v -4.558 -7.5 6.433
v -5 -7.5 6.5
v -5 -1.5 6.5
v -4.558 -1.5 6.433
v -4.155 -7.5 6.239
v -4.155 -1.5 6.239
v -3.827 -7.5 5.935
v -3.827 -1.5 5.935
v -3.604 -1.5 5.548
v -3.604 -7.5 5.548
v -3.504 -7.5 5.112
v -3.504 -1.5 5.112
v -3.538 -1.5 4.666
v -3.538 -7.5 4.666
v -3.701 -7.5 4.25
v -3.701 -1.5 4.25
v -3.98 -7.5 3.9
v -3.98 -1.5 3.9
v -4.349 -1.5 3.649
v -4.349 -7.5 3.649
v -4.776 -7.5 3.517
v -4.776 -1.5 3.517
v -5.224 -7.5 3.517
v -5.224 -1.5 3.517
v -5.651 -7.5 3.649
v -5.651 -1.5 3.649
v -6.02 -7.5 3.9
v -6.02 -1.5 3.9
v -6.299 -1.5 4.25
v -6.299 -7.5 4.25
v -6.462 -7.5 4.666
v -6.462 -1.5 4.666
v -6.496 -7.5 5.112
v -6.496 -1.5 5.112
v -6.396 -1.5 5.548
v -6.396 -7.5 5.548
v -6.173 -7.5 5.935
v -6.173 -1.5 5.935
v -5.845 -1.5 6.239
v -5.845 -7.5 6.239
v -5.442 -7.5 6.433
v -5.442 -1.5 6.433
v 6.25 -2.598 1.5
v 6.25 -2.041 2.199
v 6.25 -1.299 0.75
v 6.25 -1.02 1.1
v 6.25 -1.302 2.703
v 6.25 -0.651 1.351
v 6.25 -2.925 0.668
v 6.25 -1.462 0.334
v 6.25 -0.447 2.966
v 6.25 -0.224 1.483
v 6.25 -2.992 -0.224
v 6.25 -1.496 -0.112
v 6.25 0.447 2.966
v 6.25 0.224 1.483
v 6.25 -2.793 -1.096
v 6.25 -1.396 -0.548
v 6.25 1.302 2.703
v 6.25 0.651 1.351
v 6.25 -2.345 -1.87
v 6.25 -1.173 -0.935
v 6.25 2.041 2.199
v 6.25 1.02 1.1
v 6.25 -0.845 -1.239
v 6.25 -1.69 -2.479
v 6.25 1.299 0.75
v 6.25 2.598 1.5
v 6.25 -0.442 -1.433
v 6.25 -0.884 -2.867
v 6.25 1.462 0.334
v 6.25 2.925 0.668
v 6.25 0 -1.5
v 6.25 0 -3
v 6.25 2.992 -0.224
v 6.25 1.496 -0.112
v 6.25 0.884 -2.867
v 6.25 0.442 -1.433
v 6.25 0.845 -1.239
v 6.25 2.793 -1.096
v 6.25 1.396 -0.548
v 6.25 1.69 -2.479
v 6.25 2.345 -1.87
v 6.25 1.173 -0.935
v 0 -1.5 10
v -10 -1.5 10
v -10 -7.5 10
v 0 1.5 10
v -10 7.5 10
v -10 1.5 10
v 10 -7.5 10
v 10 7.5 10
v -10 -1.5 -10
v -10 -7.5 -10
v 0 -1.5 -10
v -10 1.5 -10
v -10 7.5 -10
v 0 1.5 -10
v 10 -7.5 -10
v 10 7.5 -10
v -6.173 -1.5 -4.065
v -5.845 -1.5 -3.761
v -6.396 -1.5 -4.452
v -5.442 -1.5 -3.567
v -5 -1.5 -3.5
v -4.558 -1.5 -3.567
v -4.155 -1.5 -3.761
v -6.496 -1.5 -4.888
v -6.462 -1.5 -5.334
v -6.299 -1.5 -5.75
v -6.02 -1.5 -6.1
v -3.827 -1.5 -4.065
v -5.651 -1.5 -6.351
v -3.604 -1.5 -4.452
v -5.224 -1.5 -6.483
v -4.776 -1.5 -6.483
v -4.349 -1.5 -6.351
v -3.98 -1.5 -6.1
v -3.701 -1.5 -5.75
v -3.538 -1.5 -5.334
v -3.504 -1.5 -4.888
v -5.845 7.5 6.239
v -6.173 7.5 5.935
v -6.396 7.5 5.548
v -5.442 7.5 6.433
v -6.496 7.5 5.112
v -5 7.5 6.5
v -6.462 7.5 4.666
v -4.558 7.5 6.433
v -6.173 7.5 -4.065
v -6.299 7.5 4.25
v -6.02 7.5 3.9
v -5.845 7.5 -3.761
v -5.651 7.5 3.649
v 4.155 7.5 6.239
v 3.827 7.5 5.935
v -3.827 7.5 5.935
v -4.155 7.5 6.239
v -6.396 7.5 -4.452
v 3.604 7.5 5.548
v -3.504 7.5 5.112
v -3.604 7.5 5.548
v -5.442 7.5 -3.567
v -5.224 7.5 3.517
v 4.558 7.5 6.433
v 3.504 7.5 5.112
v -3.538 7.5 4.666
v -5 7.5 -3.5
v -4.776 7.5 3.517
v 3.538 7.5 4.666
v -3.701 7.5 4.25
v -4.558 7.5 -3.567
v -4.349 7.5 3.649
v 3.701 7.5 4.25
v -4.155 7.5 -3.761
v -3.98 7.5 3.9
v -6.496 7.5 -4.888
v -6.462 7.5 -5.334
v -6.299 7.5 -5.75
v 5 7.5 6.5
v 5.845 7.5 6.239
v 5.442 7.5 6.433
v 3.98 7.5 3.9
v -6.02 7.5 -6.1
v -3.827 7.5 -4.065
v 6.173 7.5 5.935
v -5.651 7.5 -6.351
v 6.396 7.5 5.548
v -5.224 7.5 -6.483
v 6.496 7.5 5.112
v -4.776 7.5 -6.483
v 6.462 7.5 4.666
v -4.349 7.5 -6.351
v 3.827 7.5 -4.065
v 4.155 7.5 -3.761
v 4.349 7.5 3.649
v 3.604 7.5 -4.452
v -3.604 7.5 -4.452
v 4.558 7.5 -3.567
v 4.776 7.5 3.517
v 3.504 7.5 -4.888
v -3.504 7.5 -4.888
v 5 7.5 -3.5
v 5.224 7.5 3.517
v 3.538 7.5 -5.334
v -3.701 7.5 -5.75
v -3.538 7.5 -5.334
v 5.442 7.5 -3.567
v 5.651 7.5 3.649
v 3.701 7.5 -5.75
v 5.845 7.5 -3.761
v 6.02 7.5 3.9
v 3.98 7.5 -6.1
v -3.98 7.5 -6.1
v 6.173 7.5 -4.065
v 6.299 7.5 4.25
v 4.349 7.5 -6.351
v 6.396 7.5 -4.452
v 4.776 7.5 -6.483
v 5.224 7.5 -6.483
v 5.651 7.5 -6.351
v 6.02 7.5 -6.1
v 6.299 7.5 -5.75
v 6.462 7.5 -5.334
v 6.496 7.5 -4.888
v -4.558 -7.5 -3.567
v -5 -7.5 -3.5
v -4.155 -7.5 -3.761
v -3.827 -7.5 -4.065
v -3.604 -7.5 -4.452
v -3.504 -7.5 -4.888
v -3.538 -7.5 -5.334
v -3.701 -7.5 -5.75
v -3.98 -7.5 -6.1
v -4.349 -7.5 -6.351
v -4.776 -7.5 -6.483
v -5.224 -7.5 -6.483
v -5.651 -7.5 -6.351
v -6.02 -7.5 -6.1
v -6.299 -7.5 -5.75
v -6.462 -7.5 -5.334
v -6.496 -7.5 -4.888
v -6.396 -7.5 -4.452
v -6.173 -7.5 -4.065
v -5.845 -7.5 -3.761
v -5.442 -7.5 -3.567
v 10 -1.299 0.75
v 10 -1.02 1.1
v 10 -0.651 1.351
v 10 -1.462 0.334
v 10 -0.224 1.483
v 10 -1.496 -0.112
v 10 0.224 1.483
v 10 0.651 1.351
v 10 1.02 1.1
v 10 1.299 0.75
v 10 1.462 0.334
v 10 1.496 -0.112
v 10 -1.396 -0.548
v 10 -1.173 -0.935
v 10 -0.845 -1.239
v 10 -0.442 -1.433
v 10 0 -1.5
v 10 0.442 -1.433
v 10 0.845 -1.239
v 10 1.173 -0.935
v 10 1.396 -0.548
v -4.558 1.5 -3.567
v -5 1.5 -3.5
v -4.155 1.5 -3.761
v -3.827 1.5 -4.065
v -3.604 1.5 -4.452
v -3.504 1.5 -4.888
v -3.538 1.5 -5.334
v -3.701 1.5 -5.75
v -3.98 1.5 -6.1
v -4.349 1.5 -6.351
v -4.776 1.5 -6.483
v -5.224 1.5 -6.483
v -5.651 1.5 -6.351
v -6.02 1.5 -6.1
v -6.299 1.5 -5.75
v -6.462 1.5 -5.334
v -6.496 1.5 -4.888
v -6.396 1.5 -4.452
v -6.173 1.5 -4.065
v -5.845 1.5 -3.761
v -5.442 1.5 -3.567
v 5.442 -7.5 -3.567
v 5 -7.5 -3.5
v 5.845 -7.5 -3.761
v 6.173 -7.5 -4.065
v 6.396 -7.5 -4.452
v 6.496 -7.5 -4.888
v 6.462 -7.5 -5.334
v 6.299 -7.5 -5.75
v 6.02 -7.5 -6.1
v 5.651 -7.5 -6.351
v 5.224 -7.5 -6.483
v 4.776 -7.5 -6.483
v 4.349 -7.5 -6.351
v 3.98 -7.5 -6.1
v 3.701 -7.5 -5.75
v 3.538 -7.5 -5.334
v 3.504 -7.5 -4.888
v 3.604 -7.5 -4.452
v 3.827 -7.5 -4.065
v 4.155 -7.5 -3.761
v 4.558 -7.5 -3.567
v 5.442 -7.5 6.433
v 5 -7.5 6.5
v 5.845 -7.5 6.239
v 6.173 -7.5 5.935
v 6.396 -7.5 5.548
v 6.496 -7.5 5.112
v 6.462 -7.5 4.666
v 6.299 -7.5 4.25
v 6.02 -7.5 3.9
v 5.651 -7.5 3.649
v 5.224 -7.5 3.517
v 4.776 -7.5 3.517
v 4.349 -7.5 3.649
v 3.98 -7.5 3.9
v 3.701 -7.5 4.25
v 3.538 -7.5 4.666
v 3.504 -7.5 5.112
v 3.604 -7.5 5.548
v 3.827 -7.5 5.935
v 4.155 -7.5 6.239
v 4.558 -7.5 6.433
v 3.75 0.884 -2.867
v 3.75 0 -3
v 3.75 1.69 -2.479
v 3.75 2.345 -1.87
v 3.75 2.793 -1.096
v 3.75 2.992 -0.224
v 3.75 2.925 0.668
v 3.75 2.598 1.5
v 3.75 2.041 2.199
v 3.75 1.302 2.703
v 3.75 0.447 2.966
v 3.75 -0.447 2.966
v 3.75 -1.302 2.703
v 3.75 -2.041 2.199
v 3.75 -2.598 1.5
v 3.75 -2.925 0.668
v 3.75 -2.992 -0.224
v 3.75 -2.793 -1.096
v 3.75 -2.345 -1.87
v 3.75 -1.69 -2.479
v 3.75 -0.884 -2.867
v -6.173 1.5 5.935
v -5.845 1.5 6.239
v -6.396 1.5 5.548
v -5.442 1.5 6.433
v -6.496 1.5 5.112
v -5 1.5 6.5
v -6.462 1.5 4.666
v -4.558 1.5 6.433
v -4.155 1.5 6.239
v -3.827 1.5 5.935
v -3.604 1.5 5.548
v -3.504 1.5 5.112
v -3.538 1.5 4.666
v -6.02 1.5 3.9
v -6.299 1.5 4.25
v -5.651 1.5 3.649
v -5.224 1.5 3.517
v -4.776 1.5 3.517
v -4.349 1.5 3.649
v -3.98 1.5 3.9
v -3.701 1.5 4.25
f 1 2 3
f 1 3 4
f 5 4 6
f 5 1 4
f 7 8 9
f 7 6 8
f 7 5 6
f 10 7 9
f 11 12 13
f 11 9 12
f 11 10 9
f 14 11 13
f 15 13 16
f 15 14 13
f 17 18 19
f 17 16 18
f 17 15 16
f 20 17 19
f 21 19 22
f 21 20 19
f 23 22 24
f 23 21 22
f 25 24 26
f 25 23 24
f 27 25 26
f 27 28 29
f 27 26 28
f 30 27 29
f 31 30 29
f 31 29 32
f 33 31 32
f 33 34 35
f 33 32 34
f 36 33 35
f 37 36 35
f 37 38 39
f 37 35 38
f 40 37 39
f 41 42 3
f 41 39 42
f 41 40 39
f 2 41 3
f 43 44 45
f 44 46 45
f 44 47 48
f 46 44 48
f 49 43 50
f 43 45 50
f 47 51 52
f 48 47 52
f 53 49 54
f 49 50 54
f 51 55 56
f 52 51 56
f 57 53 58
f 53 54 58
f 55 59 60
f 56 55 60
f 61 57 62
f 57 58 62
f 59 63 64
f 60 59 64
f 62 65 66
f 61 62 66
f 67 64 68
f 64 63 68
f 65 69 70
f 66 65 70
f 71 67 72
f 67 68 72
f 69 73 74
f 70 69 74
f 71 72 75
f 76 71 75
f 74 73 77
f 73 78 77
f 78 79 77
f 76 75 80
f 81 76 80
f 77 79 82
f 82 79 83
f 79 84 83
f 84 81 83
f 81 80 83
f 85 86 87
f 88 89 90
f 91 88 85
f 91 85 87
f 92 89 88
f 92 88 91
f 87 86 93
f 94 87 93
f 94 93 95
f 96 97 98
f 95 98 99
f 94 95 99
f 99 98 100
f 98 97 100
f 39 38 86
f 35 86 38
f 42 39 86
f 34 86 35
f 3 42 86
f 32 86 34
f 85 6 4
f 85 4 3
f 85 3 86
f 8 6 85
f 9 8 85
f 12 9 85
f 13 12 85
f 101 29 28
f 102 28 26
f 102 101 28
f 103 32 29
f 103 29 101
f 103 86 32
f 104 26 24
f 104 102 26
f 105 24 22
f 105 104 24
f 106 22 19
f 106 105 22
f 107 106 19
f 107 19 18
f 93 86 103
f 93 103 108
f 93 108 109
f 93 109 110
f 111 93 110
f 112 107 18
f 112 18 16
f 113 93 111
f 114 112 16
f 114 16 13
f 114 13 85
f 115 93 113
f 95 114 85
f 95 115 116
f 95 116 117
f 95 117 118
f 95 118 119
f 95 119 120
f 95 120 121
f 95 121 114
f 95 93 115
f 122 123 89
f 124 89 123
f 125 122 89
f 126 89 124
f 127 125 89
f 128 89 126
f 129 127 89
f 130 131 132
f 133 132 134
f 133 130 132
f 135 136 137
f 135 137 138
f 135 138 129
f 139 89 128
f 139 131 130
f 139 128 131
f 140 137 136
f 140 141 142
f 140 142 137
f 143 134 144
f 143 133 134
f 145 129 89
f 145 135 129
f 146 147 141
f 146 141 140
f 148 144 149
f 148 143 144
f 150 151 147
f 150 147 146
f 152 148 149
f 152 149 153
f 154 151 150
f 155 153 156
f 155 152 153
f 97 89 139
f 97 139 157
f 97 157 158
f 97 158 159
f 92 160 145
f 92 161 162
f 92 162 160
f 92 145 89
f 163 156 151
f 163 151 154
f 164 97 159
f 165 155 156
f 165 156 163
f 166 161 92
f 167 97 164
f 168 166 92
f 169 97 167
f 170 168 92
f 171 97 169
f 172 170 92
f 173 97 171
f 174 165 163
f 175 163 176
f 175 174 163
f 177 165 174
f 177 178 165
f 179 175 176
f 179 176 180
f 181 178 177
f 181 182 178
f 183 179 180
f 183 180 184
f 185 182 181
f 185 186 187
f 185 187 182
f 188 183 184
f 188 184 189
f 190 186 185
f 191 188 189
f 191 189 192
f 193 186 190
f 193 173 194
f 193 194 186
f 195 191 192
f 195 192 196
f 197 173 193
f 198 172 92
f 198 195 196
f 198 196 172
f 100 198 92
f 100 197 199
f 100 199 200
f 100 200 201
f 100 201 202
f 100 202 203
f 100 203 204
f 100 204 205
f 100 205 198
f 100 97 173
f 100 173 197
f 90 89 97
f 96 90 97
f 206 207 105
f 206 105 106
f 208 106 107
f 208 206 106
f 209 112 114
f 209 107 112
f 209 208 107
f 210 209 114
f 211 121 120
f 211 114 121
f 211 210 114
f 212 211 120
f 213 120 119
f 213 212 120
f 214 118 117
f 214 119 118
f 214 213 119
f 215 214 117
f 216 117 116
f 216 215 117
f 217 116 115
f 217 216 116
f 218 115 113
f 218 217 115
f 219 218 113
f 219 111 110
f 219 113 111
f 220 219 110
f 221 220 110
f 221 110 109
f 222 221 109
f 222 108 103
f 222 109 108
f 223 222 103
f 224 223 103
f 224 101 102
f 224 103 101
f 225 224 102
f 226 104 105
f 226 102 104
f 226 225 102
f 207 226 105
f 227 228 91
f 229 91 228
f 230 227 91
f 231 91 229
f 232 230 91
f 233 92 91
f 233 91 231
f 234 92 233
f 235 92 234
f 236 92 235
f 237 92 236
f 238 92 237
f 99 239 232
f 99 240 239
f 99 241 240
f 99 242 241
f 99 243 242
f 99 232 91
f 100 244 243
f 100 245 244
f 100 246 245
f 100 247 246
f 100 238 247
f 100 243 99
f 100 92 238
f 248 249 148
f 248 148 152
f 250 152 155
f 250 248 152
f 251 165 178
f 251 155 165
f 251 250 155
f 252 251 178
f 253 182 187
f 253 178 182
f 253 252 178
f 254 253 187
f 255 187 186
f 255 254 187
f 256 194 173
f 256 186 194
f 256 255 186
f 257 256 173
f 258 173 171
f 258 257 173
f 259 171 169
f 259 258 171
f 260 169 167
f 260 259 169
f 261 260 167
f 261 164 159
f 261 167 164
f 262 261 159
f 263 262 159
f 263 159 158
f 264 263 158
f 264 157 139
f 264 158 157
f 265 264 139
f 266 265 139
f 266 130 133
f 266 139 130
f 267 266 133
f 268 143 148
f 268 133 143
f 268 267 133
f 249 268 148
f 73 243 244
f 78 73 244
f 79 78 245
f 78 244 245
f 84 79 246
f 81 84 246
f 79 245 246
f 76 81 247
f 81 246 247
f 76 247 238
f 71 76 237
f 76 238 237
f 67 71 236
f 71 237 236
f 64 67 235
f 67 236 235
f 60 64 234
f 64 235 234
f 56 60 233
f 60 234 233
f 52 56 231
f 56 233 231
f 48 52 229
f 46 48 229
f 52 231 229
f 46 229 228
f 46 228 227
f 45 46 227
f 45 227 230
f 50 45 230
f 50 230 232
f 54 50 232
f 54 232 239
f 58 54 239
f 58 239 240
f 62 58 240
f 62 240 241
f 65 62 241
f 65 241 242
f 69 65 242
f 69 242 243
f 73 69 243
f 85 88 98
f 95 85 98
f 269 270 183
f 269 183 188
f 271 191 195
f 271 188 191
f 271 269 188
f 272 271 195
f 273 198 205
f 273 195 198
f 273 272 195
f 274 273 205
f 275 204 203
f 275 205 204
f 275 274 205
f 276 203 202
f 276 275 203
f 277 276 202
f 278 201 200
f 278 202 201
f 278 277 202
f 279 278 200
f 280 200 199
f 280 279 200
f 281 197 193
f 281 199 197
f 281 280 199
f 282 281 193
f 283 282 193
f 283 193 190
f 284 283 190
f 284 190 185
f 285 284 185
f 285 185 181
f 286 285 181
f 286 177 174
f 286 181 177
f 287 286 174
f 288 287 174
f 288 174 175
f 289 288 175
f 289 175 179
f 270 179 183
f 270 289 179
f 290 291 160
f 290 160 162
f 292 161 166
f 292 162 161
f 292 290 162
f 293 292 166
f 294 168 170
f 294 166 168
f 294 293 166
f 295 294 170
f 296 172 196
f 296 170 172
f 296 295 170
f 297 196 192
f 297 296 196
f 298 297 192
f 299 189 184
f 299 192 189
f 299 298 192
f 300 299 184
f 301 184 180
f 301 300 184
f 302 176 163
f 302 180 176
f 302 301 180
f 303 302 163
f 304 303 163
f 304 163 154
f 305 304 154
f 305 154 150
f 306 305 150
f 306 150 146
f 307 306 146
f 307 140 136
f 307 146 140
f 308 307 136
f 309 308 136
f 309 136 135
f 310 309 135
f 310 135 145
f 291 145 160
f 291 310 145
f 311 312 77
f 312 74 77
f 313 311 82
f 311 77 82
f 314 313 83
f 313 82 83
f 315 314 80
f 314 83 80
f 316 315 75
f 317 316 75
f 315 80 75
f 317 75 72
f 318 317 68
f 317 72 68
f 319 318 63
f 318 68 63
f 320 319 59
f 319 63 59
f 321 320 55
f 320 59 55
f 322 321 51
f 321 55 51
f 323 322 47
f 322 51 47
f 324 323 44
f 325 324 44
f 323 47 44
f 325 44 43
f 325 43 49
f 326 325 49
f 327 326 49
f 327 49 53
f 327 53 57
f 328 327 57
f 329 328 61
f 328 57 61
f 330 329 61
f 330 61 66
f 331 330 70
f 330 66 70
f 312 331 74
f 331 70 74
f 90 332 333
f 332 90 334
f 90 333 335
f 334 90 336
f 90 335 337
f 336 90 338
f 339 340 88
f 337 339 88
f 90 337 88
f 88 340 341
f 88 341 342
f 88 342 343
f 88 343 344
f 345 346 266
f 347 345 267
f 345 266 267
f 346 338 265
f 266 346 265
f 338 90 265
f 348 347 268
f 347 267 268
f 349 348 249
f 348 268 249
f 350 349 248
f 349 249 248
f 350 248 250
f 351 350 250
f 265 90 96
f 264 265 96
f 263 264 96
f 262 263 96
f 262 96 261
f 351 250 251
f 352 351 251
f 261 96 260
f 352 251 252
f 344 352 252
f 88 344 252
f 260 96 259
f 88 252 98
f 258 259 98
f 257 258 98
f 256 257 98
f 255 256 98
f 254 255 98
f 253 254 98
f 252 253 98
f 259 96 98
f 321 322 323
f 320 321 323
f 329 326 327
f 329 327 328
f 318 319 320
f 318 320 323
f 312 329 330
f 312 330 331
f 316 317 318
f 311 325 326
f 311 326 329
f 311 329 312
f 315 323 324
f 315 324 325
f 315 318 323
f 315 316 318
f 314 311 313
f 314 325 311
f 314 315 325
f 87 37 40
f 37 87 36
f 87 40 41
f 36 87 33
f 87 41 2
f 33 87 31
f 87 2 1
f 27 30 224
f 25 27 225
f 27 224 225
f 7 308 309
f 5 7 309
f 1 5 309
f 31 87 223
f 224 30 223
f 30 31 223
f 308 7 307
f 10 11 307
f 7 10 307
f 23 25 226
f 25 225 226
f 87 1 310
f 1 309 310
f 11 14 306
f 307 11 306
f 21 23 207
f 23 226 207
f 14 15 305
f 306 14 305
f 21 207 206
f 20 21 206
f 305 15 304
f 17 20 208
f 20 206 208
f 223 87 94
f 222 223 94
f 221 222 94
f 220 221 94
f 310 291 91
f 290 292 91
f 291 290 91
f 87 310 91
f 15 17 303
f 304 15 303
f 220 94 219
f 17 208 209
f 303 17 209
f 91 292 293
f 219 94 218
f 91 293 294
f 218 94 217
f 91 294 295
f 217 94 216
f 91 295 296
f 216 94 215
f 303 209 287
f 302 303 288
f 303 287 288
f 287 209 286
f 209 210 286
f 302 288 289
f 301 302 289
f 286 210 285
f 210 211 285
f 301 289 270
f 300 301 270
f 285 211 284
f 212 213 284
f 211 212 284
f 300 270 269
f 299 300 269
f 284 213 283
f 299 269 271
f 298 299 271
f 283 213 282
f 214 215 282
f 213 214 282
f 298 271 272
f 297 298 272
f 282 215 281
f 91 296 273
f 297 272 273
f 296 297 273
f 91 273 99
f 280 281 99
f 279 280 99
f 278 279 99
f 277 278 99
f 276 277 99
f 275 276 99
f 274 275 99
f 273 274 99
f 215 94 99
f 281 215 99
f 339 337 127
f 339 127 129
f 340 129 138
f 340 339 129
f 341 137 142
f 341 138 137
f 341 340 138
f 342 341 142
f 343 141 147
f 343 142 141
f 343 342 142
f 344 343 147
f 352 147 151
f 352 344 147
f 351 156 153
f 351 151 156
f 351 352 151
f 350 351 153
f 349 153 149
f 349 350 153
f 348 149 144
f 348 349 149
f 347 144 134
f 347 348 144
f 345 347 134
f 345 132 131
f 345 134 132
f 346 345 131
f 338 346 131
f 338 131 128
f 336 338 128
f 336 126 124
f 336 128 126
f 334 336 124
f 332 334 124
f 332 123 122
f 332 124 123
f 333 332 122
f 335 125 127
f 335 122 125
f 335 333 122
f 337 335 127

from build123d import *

# Parameters (mm, degrees)
SKETCH1_W            = 20
SKETCH1_H            = 20
BOSS_EXTRUDE1_DEPTH  = 7.5
SKETCH1_3_W          = 20
SKETCH1_3_H          = 20
CUT_EXTRUDE2_DEPTH   = 1.5
SKETCH3_W            = 10
SKETCH3_H            = 20
BOSS_EXTRUDE2_DEPTH  = 1.5
SKETCH4_R            = 1.5
CUT_EXTRUDE3_DEPTH   = 5
MOUNTHOLE_DEPTH      = 17.007810594
MOUNTHOLE_DEPTH_BACK = 17.007810594
SKETCH5_R            = 1.5
SKETCH6_R            = 3
CUT_EXTRUDE5_DEPTH   = 1.25


with BuildPart() as part:
    # Sketch1 → Boss-Extrude1 (new, symmetric)
    with BuildSketch(Plane(origin=(0, 0, 0), x_dir=(1, 0, 0), z_dir=(0, 1, 0))):
        Rectangle(SKETCH1_W, SKETCH1_H)
    extrude(amount=BOSS_EXTRUDE1_DEPTH, both=True)

    # Sketch1<3> → Cut-Extrude2 (cut, symmetric)
    with BuildSketch(Plane(origin=(0, 0, 0), x_dir=(1, 0, 0), z_dir=(0, 1, 0))):
        Rectangle(SKETCH1_3_W, SKETCH1_3_H)
    extrude(amount=CUT_EXTRUDE2_DEPTH, both=True, mode=Mode.SUBTRACT)


with BuildPart() as cut_extrude2_piece_1:
    # of the separate pieces the step leaves, piece 1, a body of its own (cut_extrude2_pieces)
    add(part.part.solids().sort_by_distance((-10, -7.5, -10))[0])



with BuildPart() as cut_extrude2_piece_2:
    # of the separate pieces the step leaves, piece 2, a body of its own (cut_extrude2_pieces)
    add(part.part.solids().sort_by_distance((-10, 1.5, -10))[0])


with BuildPart() as cut_extrude2_piece_1_1:
    add(cut_extrude2_piece_1.part)

    add(cut_extrude2_piece_2.part)  # Boss-Extrude2 merges Cut-Extrude2 piece 2
    # Sketch3 → Boss-Extrude2 (add, symmetric)
    with BuildSketch(Plane(origin=(0, 0, 0), x_dir=(1, 0, 0), z_dir=(0, 1, 0))):
        with Locations((5, 0)):
            Rectangle(SKETCH3_W, SKETCH3_H)
    extrude(amount=BOSS_EXTRUDE2_DEPTH, both=True)

    # Sketch4 → Cut-Extrude3 (cut)
    with BuildSketch(Plane(origin=(10, 0, 0), x_dir=(0, 0, -1), z_dir=(1, 0, 0))):
        Circle(SKETCH4_R)
    extrude(amount=-CUT_EXTRUDE3_DEPTH, mode=Mode.SUBTRACT)

    # Sketch5 → mounthole (cut, two sides: drawn at the far end of the back side and taken through both)
    with BuildSketch(Plane(origin=(0, 0, 0), x_dir=(1, 0, 0), z_dir=(0, 1, 0)).offset(-MOUNTHOLE_DEPTH_BACK)):
        with Locations((-5, 5)):
            Circle(SKETCH5_R)
        with Locations((5, 5)):
            Circle(SKETCH5_R)
        with Locations((5, -5)):
            Circle(SKETCH5_R)
        with Locations((-5, -5)):
            Circle(SKETCH5_R)
    extrude(amount=MOUNTHOLE_DEPTH + MOUNTHOLE_DEPTH_BACK, mode=Mode.SUBTRACT)

    # Sketch6 → Cut-Extrude5 (cut, symmetric)
    with BuildSketch(Plane(origin=(5, 0, 0), x_dir=(0, 0, -1), z_dir=(1, 0, 0))):
        Circle(SKETCH6_R)
    extrude(amount=CUT_EXTRUDE5_DEPTH, both=True, mode=Mode.SUBTRACT)


solid = cut_extrude2_piece_1_1.part
